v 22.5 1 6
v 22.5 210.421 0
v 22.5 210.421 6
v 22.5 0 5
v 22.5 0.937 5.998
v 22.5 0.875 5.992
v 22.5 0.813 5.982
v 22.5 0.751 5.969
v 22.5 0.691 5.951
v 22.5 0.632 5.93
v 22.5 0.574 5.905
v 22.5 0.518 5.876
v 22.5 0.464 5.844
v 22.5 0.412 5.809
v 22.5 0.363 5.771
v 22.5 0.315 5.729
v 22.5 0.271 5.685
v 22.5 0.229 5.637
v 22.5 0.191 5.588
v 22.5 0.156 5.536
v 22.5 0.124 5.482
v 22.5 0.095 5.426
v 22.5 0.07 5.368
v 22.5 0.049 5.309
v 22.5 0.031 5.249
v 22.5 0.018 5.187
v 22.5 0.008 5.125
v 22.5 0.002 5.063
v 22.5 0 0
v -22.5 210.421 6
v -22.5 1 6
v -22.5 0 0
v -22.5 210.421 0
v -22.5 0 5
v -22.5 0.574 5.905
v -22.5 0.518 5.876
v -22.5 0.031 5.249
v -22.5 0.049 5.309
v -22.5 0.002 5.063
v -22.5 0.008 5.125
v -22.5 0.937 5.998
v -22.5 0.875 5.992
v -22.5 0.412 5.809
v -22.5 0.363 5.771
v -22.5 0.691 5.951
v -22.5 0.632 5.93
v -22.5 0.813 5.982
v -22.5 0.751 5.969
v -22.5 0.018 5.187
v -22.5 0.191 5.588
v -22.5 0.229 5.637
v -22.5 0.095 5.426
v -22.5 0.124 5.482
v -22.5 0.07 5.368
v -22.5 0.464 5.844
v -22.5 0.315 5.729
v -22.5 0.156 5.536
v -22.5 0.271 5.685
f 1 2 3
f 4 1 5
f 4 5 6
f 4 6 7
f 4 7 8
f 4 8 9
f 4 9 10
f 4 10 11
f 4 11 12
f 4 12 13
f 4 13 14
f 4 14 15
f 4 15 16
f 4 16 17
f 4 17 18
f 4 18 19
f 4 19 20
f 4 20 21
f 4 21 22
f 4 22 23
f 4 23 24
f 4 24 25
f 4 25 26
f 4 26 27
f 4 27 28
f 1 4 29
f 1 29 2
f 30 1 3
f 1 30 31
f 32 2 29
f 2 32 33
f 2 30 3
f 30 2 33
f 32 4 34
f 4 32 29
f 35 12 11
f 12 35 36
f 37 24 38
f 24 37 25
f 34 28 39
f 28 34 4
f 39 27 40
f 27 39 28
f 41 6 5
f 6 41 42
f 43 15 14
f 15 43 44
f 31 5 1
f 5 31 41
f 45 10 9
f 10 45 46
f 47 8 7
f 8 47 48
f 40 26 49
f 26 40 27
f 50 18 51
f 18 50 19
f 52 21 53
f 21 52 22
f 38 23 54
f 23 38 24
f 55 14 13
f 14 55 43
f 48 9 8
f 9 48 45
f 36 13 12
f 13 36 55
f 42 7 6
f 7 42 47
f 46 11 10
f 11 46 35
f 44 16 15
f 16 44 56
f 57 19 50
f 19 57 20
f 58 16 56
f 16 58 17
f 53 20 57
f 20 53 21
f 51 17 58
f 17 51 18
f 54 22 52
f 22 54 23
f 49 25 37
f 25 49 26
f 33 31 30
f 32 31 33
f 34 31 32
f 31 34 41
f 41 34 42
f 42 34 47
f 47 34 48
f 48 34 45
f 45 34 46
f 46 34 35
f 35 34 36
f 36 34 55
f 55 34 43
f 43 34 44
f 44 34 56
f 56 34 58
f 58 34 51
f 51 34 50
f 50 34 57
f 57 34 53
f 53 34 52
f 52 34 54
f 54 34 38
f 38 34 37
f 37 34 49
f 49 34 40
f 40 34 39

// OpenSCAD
// file: functions.scad
function fretDistance(fret, scaleLength) =
    scaleLength - scaleLength / pow(2, fret / 12);

function lerp(a, b, x) =
    a + (b - a) * x;
// file: config.scad
use <functions.scad>;

$fn = 100;

// Body
// ----

// X, Y, Roundness
bodyTop = [0, 170, 40];
bodyBottom = [0, -60, 60];
lowerBout = [85, 0, 30];
upperBout = [65, 130, 30];
waist = [55, 80, 30];

bodyLength = [bodyTop[1] - bodyBottom[1]];
maxBodyWidth = [2 * lowerBout[2]];
bodyDepth = 50;

soundboardThickness = 1.8;
backThickness = 1.8;
sideThickness = 1.8;

sideDepth = bodyDepth - backThickness - soundboardThickness;

// Kerf
// ----

useKerf = true;
kerfWidth = 5;
kerfHeight = 10;

// Neck
// ----

neckWidthNarrow = 35;
neckWidthWide = 45;
neckDepthNarrow = 10;
neckDepthWide = 16;

// Heel
// ----

heelWidth = 10;
heelLength = 30;

// Heel Block
// ----------

heelBlockWidth = 30;
heelBlockDepth = 10;

// Heel Dovetail
// -------------

heelDovetailWidth = neckWidthWide - 20;
heelDovetailHeight = sideDepth + soundboardThickness - 10;
heelDovetailDepth = 10;
heelDovetailOffset = 5;
heelDovetailTaper = 1.1;

// Nut
// ---

nutWidth = 4;

pinHeight = 3;
pinRadius = 0.75;
stringSpacing = 9.525;

// Fingerboard
// -----------

scaleLength = 340;
numberOfFrets = 16;

fretWidth = 1.35;
fretDepth = 0.94;
maxFretLength = neckWidthWide;

fingerboardLength = fretDistance(numberOfFrets, scaleLength) + fretWidth + nutWidth;
maxFingerboardWidth = neckWidthWide;
fingerboardDepth = 6;

fingerboardSlopeRadius = 1;

fretFileAngle = 70;

// Beziers
// -------
topUpperBoutBezier = [
    [bodyTop[0], bodyTop[1]],
    [bodyBottom[0] + bodyTop[2], bodyTop[1]],
    [upperBout[0], upperBout[1] + upperBout[2]],
    [upperBout[0], upperBout[1]],
];

upperBoutWaistBezier = [
    [upperBout[0], upperBout[1]],
    [upperBout[0], upperBout[1] - upperBout[2]],
    [waist[0], waist[1] + waist[2]],
    [waist[0], waist[1]]
];

waistLowerBoutBezier = [
    [waist[0], waist[1]],
    [waist[0], waist[1] - waist[2]],
    [lowerBout[0], lowerBout[1] + lowerBout[2]],
    [lowerBout[0], lowerBout[1]]
];

lowerBoutBottomBezier = [
    [lowerBout[0], lowerBout[1]],
    [lowerBout[0], lowerBout[1] - lowerBout[2]],
    [bodyBottom[0] + bodyBottom[2], bodyBottom[1]],
    [bodyBottom[0], bodyBottom[1]]
];
// main file
include <config.scad>;

module halfFingerboard() {
    translate([0, fingerboardSlopeRadius, 0])
        cube([maxFingerboardWidth / 2,
              fingerboardLength - fingerboardSlopeRadius,
              fingerboardDepth]);
        cube([maxFingerboardWidth / 2,
              fingerboardLength,
              fingerboardDepth - fingerboardSlopeRadius]);
    translate([0, fingerboardSlopeRadius,
               fingerboardDepth - fingerboardSlopeRadius])
        rotate([0, 90, 0])
            cylinder(maxFingerboardWidth / 2, r=fingerboardSlopeRadius);
}

module fingerboard() {
    halfFingerboard();
    mirror([1, 0, 0])
        halfFingerboard();
}

fingerboard();
